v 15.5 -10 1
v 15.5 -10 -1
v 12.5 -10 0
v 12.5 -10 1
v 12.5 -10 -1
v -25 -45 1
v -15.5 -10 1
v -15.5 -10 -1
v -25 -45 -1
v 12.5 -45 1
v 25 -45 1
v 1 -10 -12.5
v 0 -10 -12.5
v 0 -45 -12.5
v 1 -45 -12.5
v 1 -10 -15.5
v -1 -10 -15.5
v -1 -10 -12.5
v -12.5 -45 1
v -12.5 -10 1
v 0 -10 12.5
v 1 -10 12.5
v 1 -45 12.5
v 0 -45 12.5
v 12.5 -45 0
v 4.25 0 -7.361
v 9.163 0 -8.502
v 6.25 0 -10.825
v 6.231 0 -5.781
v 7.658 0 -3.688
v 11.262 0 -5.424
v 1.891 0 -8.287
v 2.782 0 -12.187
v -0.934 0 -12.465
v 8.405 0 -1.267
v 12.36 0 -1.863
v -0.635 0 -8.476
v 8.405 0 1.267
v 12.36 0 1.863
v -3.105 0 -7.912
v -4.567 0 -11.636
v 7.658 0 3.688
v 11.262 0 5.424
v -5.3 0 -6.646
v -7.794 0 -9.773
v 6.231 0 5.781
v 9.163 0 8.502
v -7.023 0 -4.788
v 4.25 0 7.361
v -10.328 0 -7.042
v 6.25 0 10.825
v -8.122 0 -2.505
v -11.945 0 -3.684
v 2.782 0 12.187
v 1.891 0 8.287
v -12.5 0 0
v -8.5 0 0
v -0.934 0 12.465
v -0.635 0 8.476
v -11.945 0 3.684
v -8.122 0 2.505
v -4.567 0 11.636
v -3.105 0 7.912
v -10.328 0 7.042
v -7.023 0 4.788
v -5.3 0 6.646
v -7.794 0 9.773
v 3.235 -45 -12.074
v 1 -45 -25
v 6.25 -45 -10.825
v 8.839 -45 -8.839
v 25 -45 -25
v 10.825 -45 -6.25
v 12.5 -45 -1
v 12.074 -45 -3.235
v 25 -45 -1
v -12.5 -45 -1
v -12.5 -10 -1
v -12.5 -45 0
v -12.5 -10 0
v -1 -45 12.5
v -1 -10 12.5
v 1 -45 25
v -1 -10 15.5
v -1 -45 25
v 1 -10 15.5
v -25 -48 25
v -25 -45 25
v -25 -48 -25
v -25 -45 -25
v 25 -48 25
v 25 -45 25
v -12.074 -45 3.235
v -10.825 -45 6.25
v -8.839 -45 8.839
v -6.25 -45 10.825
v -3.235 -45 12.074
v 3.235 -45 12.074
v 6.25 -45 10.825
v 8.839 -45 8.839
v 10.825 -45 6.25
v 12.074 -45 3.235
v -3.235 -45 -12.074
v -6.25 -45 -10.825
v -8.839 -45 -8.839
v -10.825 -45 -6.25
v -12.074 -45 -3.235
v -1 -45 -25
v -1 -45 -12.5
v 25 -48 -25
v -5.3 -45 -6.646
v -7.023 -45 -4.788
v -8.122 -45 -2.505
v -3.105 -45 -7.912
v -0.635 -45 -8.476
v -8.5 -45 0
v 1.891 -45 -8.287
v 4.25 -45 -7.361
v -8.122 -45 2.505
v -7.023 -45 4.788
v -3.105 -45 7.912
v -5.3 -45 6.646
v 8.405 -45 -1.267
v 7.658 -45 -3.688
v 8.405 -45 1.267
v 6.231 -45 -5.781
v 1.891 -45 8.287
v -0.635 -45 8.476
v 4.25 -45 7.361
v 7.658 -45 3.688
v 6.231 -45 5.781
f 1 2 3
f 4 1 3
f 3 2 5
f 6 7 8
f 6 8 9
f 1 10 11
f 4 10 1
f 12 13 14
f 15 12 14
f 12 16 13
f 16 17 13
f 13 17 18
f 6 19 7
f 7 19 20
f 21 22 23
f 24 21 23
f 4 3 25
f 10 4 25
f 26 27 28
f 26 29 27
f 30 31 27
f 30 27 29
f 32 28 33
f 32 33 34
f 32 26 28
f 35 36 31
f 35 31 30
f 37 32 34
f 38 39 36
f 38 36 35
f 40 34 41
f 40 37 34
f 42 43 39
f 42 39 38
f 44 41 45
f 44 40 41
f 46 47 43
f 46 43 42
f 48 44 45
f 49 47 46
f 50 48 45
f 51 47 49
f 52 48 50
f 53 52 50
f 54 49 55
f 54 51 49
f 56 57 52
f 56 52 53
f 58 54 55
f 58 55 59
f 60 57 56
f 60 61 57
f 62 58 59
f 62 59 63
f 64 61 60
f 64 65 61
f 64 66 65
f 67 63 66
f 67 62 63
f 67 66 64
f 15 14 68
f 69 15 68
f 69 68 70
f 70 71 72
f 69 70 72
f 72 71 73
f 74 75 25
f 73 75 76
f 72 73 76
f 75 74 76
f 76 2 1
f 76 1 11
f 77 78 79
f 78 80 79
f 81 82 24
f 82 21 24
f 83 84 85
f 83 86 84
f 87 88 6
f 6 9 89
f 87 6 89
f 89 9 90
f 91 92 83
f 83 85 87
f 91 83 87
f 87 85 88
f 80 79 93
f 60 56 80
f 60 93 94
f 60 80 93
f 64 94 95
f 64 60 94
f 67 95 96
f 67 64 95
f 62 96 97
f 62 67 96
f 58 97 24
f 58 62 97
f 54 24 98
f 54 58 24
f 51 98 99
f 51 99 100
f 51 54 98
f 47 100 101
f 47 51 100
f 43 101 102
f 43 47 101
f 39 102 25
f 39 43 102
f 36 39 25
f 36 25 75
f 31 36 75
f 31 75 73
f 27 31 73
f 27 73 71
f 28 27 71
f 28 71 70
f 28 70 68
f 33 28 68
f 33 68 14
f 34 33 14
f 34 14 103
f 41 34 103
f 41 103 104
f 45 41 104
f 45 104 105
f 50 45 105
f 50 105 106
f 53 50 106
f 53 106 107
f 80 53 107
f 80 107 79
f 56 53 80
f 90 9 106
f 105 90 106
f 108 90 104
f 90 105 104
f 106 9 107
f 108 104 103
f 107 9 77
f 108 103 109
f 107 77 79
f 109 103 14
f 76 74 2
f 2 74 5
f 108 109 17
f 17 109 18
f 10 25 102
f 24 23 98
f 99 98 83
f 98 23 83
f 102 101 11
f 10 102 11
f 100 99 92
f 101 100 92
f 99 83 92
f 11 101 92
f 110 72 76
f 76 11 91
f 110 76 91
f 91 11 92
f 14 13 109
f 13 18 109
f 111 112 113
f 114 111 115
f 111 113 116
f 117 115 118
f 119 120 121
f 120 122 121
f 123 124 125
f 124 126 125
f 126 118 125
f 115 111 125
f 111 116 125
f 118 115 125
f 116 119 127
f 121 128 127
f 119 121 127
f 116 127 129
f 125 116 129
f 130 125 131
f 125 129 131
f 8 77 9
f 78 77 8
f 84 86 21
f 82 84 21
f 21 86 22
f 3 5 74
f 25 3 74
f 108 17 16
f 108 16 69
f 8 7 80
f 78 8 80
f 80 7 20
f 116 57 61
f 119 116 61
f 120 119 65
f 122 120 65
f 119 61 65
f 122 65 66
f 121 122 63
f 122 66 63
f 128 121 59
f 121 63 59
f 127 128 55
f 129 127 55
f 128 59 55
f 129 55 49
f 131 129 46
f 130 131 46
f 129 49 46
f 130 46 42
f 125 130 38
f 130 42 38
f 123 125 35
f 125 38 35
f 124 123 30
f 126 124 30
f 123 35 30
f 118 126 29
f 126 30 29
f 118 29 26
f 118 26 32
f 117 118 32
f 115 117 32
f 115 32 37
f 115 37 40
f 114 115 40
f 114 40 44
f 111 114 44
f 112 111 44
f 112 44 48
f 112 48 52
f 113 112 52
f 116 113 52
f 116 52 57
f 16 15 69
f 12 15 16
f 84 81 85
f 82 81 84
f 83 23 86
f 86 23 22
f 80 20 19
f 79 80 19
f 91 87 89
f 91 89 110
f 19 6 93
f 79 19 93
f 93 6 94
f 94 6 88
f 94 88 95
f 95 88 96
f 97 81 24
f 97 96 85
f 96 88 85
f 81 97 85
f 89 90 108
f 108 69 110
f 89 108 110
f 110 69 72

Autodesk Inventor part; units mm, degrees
ref_plane "YZ Plane" through (0, 0, 0) normal (1, 0, 0) x (0, 1, 0)
ref_plane "XZ Plane" through (0, 0, 0) normal (0, 1, 0) x (-1, 0, 0)
ref_plane "XY Plane" through (0, 0, 0) normal (0, 0, 1) x (1, 0, 0)
sketch "Sketch1" plane through (0, 0, 0) normal (0, 1, 0) x (-1, 0, 0)
  circle A0 centre (0, 0) radius 12.5
  circle A1 centre (0, 0) radius 8.5
  dimension "d0" = 25
  dimension "d1" = 4
extrude "Extrusion1" add sketch "Sketch1" against normal blind 45
sketch "Sketch2" plane through (0, -45, 0) normal (0, -1, 0) x (1, 0, 0)
  line L0 (-25, -25) -> (25, -25)
  line L1 (25, -25) -> (25, 25)
  line L2 (25, 25) -> (-25, 25)
  line L3 (-25, 25) -> (-25, -25)
  line L4 (-25, -25) -> (25, 25) construction
  line L5 (25, -25) -> (-25, 25) construction
  point P0 (0, 0)
  dimension "d4" = 50
  dimension "d5" = 50
extrude "Extrusion2" add sketch "Sketch2" along normal blind 3
sketch "Sketch3" plane through (0, 0, 0) normal (1, 0, 0) x (0, 1, 0)
  line L0 (0, -12.5) -> (-45, -12.5) construction
  line L1 (-45, 25) -> (-45, -25) construction
  line L2 (-10, -12.5) -> (-45, -12.5)
  line L3 (-45, -12.5) -> (-45, -15.5)
  line L4 (-45, -15.5) -> (-10, -15.5)
  line L5 (-10, -15.5) -> (-10, -12.5)
  line L6 (-10, -15.5) -> (-45, -25)
  line L7 (-45, -25) -> (-45, -15.5)
  point P0 (0, 0)
  dimension "d8" = 3
  dimension "d9" = 10
extrude "Extrusion3" add sketch "Sketch3" along normal mid plane 2
pattern_circular "Circular Pattern1" count 4 over 360 about axis through (0, -10, 0) along (0, 1, 0) of "Extrusion3"
properties part number "pin_sleeve"
